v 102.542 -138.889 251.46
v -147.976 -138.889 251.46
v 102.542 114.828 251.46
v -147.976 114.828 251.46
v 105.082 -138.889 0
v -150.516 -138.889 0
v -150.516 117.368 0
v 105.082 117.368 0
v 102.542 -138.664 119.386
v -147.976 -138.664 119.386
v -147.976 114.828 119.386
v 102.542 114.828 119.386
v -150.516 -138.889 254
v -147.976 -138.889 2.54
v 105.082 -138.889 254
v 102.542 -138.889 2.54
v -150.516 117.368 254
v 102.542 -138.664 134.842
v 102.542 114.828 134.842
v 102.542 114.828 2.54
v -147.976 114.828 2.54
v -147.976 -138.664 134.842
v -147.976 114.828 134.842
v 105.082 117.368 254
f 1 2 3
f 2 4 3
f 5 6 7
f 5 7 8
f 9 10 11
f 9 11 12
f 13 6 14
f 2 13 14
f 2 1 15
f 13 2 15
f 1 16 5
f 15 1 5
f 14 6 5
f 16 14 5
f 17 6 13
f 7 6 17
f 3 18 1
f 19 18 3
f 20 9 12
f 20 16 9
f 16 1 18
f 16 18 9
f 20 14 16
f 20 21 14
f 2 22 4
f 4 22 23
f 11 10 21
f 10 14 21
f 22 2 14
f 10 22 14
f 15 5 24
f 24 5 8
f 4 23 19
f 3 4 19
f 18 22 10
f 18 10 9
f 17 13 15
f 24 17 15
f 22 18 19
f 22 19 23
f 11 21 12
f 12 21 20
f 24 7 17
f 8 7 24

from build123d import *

# Parameters (mm, degrees)
F0_W     = 255.5983066559
F0_H     = 256.2570720911
F1_DEPTH = 254
F2_T     = -2.54
F4_DEPTH = 253.492


with BuildPart() as f1:
    # F0 (on Top) → F1 (new body)
    with BuildSketch(Plane.XY):
        with Locations((-22.7167755365, -10.7608214021)):
            Rectangle(F0_W, F0_H)
    extrude(amount=F1_DEPTH)

    # F2
    f2_openings = [f1.faces().sort_by_distance(p)[0] for p in [
        (-22.716776, -138.889357, 127),
    ]]
    offset(amount=F2_T, openings=f2_openings)

    # F3 (on face) → F4 (join)
    with BuildSketch(Plane.XZ.offset(-114.8277146435)):
        Polygon((102.5423777914, 119.3862035871), (102.5423777914, 127), (102.5423777914, 134.8422765732), (-147.9759288645, 134.8422765732), (-147.9759288645, 119.3862035871), align=None)
    extrude(amount=F4_DEPTH)


solid = f1.part
